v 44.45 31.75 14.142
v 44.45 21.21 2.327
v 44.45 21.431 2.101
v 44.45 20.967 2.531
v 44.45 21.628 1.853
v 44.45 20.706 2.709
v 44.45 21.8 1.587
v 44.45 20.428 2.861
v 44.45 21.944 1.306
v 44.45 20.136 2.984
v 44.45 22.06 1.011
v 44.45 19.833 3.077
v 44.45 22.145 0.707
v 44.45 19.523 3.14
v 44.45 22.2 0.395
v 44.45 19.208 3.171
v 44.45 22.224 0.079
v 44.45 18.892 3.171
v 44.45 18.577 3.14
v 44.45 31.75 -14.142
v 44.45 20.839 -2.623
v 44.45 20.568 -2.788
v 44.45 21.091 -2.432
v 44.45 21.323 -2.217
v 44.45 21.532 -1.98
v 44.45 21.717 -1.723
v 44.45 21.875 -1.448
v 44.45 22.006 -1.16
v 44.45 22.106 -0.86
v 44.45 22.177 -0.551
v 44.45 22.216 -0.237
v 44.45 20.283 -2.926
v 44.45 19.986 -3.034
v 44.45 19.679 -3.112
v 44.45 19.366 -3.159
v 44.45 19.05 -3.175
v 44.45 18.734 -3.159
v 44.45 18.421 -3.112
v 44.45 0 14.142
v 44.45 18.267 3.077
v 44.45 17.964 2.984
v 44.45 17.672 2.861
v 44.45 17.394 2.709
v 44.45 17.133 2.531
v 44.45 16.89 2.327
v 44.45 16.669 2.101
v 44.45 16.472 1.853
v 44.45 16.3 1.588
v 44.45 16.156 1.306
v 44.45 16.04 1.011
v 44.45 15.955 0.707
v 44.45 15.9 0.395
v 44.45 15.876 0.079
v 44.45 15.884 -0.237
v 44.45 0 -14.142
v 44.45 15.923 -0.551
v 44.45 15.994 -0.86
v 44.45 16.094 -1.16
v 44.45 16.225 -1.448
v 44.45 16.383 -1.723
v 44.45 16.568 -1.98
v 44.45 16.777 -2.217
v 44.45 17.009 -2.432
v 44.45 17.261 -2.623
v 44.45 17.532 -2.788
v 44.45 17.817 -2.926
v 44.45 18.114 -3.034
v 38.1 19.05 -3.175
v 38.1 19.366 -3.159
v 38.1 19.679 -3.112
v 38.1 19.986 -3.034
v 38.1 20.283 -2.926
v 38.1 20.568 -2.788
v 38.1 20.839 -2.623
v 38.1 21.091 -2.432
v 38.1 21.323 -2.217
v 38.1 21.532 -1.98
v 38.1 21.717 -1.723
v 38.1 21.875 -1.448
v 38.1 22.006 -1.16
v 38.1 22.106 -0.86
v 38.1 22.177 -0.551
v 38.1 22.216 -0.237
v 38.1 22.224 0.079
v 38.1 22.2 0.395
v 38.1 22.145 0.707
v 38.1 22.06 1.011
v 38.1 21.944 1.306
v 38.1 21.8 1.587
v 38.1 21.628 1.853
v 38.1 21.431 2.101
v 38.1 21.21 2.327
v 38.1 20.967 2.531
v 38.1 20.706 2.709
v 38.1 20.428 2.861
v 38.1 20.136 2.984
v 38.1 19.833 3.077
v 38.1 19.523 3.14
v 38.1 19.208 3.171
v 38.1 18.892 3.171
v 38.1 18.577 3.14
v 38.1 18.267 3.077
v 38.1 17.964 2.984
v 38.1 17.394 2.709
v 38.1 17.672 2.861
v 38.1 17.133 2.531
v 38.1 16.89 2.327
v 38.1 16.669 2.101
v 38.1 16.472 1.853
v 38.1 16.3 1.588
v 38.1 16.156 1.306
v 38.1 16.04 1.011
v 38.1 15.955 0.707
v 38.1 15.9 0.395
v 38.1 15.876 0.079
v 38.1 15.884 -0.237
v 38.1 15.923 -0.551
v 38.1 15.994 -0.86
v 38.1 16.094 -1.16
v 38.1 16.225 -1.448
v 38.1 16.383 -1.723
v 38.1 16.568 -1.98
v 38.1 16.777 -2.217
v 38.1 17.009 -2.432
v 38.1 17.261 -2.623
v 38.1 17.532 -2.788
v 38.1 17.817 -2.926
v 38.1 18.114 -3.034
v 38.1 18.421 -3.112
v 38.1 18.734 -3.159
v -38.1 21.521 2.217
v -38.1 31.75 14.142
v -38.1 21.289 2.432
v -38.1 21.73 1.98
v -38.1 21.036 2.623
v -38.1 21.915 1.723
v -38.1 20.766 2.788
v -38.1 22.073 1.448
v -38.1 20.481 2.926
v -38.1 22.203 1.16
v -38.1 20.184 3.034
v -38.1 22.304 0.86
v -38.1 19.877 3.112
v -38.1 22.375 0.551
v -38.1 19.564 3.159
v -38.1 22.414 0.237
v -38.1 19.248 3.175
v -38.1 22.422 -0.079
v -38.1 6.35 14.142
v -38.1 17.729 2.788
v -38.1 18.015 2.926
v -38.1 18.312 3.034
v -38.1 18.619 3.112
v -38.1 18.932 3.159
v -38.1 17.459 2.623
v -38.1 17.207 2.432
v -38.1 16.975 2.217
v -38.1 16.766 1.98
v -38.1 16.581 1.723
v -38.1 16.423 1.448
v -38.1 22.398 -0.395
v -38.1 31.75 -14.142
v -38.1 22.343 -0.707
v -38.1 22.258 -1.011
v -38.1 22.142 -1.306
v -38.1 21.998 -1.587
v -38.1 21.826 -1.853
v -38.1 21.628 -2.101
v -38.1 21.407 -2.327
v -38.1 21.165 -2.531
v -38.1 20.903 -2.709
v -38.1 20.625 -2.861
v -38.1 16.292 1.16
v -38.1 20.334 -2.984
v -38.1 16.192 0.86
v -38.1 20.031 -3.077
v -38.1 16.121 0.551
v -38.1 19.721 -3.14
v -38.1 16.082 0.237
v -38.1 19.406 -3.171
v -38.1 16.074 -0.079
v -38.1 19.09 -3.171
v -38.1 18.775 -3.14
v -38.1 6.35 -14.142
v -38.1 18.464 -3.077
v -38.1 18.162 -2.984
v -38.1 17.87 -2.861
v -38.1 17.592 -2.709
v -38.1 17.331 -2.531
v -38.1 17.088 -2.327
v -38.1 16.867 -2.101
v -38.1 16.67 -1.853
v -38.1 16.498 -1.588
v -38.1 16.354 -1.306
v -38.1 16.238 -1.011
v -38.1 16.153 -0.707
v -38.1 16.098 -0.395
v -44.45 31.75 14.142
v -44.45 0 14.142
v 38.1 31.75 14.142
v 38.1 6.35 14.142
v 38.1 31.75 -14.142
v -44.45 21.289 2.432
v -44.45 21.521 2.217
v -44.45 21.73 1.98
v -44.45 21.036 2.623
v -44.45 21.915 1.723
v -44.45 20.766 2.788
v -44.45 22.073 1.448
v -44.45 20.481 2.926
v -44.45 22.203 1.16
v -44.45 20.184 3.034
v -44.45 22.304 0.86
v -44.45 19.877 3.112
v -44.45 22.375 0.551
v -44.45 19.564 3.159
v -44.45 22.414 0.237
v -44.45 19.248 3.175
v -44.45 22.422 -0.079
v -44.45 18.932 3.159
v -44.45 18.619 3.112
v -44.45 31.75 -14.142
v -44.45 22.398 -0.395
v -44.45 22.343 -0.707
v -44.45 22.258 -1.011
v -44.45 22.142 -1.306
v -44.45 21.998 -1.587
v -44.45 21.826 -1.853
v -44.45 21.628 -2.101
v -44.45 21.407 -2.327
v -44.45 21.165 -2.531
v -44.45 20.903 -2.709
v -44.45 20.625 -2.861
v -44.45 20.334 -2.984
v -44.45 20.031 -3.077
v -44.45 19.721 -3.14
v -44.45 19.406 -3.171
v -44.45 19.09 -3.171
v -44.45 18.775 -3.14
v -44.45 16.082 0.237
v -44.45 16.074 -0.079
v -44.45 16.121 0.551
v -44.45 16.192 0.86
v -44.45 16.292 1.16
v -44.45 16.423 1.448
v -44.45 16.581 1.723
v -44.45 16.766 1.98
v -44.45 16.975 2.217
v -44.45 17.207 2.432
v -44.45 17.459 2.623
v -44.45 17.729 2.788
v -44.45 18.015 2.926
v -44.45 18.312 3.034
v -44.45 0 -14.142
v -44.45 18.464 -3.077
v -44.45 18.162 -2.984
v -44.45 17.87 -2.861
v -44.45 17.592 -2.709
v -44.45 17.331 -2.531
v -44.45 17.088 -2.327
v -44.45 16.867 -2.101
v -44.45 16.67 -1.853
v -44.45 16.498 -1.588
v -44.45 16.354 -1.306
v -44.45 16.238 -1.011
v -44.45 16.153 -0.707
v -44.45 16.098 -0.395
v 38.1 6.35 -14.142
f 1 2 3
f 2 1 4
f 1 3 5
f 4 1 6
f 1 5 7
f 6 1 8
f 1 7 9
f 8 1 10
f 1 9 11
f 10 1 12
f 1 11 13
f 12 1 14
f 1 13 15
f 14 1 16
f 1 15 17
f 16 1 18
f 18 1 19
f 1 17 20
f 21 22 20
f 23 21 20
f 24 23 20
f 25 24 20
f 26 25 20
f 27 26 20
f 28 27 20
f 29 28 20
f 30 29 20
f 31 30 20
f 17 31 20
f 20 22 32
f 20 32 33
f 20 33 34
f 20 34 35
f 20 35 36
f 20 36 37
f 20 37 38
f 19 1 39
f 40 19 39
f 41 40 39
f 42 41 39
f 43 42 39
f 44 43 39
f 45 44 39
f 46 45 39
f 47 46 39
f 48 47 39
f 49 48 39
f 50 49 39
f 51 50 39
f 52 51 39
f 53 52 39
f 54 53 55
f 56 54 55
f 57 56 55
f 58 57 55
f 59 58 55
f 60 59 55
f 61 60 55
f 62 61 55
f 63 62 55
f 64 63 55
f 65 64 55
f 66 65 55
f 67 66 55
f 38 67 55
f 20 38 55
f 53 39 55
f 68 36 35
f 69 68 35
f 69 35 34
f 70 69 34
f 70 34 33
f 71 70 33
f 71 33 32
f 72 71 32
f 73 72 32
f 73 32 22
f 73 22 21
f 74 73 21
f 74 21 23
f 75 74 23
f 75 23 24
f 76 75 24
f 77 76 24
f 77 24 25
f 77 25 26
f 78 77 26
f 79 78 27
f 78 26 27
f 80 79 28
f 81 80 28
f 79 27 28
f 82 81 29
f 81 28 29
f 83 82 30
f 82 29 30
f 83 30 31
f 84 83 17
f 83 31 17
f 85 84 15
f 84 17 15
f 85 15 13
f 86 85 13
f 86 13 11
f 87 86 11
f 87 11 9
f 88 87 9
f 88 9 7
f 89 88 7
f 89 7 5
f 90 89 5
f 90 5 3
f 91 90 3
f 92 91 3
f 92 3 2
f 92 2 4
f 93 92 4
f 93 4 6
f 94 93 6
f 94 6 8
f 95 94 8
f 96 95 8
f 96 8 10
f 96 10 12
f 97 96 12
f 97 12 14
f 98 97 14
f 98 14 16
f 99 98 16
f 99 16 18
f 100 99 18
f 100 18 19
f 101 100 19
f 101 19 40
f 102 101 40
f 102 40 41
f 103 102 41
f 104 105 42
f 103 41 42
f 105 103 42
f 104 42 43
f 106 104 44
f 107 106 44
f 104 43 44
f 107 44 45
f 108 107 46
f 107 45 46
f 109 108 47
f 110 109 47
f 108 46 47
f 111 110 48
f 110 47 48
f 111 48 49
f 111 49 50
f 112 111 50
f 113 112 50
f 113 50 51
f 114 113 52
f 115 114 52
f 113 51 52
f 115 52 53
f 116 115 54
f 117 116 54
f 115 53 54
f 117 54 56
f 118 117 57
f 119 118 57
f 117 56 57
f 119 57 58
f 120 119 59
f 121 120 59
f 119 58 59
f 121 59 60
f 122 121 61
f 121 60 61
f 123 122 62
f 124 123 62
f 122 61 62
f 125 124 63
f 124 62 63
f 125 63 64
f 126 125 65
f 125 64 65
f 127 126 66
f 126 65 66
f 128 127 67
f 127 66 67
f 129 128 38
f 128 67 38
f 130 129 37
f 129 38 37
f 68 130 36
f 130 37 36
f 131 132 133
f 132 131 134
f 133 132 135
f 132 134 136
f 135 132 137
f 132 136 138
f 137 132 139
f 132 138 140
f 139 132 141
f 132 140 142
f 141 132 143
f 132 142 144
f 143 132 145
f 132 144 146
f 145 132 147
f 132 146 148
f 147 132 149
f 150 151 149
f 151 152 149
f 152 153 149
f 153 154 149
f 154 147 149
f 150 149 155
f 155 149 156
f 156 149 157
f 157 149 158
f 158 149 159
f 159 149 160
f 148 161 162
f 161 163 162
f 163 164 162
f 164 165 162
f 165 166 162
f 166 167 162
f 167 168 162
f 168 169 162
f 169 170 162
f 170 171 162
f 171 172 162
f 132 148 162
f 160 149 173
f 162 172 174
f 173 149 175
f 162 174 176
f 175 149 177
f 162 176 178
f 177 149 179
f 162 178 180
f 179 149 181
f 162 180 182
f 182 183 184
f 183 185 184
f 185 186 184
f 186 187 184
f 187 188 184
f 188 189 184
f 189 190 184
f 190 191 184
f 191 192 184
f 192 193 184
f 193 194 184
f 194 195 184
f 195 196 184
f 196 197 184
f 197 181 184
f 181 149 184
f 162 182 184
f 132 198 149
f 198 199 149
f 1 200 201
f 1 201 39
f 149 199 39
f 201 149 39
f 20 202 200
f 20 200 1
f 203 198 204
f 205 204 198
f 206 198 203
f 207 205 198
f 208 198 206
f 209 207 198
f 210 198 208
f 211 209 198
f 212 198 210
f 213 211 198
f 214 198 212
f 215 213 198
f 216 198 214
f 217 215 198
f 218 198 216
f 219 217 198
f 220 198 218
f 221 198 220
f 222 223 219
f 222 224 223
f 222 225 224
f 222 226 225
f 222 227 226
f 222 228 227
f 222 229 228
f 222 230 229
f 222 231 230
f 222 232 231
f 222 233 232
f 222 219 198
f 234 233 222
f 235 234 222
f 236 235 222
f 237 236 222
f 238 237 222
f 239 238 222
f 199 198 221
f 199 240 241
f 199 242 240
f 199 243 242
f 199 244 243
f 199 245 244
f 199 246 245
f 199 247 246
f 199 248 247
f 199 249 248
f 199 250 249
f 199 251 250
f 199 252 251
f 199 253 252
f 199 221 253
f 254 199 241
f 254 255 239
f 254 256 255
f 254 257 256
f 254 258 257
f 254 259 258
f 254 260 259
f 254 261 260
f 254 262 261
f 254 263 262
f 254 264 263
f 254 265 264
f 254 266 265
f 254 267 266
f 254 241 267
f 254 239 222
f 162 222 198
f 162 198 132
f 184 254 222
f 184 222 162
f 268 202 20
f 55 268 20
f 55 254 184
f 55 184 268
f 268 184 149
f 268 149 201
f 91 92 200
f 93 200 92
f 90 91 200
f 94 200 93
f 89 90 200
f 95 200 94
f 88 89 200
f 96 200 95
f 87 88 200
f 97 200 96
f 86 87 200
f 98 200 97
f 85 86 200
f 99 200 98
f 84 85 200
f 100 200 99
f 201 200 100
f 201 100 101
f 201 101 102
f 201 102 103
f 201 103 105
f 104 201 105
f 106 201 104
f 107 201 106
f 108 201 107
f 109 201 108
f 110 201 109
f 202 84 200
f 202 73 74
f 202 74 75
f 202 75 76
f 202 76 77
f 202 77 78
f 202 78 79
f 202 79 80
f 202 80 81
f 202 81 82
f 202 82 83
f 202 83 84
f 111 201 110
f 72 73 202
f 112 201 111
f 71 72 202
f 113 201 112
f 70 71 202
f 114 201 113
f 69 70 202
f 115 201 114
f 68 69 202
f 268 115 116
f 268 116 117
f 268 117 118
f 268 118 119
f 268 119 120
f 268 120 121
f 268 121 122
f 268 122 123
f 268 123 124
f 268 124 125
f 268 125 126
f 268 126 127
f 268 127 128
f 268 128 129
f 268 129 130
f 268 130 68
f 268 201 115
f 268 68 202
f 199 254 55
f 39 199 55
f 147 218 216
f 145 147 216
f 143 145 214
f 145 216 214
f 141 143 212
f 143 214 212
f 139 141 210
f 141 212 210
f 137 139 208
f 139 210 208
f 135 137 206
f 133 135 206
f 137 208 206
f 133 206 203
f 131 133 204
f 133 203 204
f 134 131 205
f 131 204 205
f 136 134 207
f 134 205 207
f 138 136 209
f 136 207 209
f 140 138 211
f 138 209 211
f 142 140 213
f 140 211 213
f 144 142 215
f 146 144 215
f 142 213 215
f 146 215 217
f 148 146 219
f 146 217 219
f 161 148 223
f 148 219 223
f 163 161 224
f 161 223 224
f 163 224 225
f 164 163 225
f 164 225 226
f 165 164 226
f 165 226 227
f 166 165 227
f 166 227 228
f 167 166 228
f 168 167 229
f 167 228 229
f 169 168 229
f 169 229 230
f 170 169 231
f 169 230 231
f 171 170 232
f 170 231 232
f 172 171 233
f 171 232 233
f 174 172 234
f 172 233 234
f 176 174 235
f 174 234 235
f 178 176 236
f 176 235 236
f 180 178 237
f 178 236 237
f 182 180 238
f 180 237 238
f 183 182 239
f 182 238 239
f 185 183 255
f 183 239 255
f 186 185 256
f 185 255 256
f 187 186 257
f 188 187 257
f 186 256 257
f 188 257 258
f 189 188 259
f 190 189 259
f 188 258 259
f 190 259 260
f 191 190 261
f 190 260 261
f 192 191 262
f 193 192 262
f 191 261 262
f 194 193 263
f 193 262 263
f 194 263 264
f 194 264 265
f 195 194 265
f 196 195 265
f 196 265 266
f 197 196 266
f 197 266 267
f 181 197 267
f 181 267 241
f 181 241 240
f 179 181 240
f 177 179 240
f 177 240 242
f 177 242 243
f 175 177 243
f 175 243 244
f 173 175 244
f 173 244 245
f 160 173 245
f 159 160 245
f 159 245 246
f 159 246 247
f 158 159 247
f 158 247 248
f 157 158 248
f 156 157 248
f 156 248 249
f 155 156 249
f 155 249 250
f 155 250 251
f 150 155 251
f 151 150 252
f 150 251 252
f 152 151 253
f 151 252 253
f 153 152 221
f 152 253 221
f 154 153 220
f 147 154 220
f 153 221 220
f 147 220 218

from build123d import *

# Parameters (mm, degrees)
SKETCH1_W           = 88.9
SKETCH1_H           = 28.284249084
BOSS_EXTRUDE1_DEPTH = 6.35
SKETCH2_W           = 6.35
SKETCH2_H           = 28.284249084
BOSS_EXTRUDE2_DEPTH = 25.4
SKETCH3_R           = 3.175
CUT_EXTRUDE1_DEPTH  = 6.35
SKETCH4_R           = 3.175
CUT_EXTRUDE2_DEPTH  = 7.62


with BuildPart() as part:
    # Sketch1 → Boss-Extrude1 (new body)
    with BuildSketch(Plane(origin=(0, 0, 0), x_dir=(1, 0, 0), z_dir=(0, 1, 0))):
        Rectangle(SKETCH1_W, SKETCH1_H)
    extrude(amount=BOSS_EXTRUDE1_DEPTH)

    # Sketch2 → Boss-Extrude2 (add)
    with BuildSketch(Plane(origin=(0, 6.35, 0), x_dir=(1, 0, 0), z_dir=(0, 1, 0))):
        with Locations((-41.275, 0)):
            Rectangle(SKETCH2_W, SKETCH2_H)
        with Locations((41.275, 0)):
            Rectangle(SKETCH2_W, SKETCH2_H)
    extrude(amount=BOSS_EXTRUDE2_DEPTH)

    # Sketch3 → Cut-Extrude1 (cut)
    with BuildSketch(Plane.ZY.offset(44.45)):
        with Locations((0, 19.247915812)):
            Circle(SKETCH3_R)
    extrude(amount=-CUT_EXTRUDE1_DEPTH, mode=Mode.SUBTRACT)

    # Sketch4 → Cut-Extrude2 (cut)
    with BuildSketch(Plane(origin=(44.45, 0, 0), x_dir=(0, 0, -1), z_dir=(1, 0, 0))):
        with Locations((0, 19.05)):
            Circle(SKETCH4_R)
    extrude(amount=-CUT_EXTRUDE2_DEPTH, mode=Mode.SUBTRACT)


solid = part.part
